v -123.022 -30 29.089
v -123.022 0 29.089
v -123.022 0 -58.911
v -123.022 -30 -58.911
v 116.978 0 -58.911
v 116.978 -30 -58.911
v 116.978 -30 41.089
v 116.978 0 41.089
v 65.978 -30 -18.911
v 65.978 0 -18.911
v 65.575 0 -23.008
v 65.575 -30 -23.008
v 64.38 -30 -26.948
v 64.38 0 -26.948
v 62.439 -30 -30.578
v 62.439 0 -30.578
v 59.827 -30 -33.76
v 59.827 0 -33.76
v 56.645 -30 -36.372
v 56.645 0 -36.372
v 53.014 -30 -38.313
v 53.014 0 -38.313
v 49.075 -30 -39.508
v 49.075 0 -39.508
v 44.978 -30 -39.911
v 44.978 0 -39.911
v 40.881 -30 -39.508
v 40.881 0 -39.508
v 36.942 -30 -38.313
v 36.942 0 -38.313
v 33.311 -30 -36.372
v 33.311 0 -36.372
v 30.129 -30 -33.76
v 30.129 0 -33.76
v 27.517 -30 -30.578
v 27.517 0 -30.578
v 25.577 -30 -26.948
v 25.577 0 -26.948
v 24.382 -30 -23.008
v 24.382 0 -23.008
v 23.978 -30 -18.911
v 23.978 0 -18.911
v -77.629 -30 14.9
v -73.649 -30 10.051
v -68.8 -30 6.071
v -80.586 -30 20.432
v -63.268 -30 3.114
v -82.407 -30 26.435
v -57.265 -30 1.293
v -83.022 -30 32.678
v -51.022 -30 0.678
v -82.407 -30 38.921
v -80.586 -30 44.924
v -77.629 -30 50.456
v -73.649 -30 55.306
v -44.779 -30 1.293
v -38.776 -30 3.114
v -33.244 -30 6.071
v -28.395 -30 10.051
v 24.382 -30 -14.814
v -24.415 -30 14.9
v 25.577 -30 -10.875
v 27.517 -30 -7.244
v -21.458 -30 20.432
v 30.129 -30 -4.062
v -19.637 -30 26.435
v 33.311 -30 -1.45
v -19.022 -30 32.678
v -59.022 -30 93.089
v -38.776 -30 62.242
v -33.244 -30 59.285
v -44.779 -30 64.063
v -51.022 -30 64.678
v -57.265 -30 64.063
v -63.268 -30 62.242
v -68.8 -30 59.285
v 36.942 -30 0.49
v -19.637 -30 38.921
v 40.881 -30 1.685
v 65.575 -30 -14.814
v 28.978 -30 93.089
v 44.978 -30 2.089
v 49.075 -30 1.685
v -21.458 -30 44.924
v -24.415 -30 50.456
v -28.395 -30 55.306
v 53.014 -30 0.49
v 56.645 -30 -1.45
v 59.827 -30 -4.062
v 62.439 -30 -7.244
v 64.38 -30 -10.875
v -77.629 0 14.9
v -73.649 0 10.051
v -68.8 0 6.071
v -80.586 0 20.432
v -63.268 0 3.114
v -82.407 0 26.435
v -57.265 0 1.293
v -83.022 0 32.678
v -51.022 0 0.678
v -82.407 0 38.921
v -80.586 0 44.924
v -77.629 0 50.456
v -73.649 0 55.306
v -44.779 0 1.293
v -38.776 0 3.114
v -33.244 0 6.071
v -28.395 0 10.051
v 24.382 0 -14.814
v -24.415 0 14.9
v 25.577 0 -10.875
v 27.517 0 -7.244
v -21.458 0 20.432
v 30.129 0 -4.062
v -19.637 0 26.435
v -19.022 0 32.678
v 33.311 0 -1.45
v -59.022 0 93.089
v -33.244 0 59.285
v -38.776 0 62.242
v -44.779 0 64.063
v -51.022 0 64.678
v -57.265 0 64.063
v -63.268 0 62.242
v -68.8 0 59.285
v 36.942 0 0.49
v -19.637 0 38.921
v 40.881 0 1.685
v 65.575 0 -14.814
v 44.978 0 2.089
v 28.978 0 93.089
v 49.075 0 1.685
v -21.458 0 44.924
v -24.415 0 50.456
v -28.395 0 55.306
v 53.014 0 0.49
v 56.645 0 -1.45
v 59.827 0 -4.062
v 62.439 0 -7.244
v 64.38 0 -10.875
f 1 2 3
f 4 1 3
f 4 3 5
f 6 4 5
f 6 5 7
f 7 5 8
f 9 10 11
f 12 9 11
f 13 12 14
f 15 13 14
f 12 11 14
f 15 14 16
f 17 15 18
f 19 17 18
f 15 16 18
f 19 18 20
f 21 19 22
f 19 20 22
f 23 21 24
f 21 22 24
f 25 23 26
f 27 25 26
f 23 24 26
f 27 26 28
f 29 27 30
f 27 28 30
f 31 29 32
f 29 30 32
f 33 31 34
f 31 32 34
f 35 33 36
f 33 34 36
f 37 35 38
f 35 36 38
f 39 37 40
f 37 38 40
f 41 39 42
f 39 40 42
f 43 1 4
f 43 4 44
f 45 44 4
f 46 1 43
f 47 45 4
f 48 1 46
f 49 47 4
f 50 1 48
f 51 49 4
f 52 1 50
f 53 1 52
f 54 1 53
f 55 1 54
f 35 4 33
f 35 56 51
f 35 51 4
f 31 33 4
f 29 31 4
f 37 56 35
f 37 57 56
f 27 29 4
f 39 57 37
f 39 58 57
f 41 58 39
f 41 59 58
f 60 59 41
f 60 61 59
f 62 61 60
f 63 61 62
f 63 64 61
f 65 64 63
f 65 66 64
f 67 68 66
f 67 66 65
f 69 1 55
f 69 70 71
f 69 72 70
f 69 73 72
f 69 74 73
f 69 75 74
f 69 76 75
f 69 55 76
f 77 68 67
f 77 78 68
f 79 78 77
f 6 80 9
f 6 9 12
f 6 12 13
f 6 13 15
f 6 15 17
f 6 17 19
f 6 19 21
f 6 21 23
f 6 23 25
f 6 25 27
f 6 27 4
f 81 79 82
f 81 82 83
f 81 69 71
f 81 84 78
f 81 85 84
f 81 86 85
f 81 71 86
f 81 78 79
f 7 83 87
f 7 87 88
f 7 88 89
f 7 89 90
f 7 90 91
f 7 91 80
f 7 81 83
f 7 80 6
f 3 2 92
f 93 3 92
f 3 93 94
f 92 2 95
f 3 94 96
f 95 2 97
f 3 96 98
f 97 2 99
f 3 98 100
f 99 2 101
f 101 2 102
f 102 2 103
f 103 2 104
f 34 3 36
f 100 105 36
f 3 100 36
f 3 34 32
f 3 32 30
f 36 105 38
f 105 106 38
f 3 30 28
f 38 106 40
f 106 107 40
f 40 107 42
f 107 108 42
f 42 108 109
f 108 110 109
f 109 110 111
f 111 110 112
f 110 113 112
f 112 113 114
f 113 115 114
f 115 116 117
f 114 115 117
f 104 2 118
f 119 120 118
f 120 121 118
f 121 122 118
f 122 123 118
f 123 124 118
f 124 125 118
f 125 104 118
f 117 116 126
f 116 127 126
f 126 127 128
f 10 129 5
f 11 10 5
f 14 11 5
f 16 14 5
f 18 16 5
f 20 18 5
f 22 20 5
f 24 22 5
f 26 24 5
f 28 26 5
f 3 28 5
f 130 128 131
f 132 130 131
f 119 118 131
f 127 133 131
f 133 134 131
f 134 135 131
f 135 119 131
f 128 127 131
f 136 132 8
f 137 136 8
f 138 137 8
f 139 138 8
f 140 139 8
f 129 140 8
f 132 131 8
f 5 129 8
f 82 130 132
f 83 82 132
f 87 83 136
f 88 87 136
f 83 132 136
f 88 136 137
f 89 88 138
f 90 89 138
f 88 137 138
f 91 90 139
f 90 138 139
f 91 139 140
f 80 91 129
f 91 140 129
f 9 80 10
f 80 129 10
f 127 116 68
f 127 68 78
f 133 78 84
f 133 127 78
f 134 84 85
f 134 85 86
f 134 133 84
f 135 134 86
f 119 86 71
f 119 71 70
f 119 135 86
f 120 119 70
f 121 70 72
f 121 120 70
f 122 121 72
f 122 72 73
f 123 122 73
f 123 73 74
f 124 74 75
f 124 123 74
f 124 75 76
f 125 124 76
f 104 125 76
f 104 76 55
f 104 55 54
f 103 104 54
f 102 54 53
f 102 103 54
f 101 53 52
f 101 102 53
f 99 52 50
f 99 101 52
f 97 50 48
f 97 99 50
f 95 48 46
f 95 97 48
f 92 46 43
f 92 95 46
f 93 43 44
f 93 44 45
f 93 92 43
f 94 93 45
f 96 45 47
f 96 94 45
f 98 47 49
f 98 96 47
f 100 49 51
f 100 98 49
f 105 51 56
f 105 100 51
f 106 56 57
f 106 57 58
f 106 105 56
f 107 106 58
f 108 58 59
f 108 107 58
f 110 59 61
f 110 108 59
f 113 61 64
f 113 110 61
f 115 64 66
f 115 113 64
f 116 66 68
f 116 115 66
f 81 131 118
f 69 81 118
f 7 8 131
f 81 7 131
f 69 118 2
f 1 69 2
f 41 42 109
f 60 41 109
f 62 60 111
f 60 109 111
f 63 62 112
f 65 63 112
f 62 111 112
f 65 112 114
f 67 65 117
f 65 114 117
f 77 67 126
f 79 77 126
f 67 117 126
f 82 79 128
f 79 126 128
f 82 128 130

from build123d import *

# Parameters (mm, degrees)
F0_R     = 32
F1_DEPTH = 30


with BuildPart() as f1:
    # F0 (on Front) → F1 (new body)
    with BuildSketch(Plane.XZ):
        with BuildLine():
            Line((-123.021963, 29.088755), (-123.021963, -58.911245))
            Line((-123.021963, -58.911245), (-14.377067, -58.911245))
            Line((-14.377067, -58.911245), (-14.377067, -18.911245))
            Line((-14.377067, -18.911245), (23.978037, -18.911245))
            ThreePointArc((23.978037, -18.911245), (30.128795, -4.062003), (44.978037, 2.088755))
            Line((44.978037, 2.088755), (44.978037, 32.678131))
            Line((44.978037, 32.678131), (116.978037, 32.678131))
            Line((116.978037, 32.678131), (116.978037, 41.088755))
            Line((116.978037, 41.088755), (28.978037, 93.088755))
            Line((28.978037, 93.088755), (-59.021963, 93.088755))
            Line((-59.021963, 93.088755), (-123.021963, 29.088755))
        make_face()
        with Locations((-51.021963, 32.678131)):
            Circle(F0_R, mode=Mode.SUBTRACT)
        with BuildLine():
            Line((-14.377067, -18.911245), (-14.377067, -58.911245))
            Line((-14.377067, -58.911245), (116.978037, -58.911245))
            Line((116.978037, -58.911245), (116.978037, 32.678131))
            Line((116.978037, 32.678131), (44.978037, 32.678131))
            Line((44.978037, 32.678131), (44.978037, 2.088755))
            ThreePointArc((44.978037, 2.088755), (59.827279, -4.062003), (65.978037, -18.911245))
            ThreePointArc((65.978037, -18.911245), (44.978037, -39.911245), (23.978037, -18.911245))
            Line((23.978037, -18.911245), (-14.377067, -18.911245))
        make_face()
    extrude(amount=F1_DEPTH)


solid = f1.part
